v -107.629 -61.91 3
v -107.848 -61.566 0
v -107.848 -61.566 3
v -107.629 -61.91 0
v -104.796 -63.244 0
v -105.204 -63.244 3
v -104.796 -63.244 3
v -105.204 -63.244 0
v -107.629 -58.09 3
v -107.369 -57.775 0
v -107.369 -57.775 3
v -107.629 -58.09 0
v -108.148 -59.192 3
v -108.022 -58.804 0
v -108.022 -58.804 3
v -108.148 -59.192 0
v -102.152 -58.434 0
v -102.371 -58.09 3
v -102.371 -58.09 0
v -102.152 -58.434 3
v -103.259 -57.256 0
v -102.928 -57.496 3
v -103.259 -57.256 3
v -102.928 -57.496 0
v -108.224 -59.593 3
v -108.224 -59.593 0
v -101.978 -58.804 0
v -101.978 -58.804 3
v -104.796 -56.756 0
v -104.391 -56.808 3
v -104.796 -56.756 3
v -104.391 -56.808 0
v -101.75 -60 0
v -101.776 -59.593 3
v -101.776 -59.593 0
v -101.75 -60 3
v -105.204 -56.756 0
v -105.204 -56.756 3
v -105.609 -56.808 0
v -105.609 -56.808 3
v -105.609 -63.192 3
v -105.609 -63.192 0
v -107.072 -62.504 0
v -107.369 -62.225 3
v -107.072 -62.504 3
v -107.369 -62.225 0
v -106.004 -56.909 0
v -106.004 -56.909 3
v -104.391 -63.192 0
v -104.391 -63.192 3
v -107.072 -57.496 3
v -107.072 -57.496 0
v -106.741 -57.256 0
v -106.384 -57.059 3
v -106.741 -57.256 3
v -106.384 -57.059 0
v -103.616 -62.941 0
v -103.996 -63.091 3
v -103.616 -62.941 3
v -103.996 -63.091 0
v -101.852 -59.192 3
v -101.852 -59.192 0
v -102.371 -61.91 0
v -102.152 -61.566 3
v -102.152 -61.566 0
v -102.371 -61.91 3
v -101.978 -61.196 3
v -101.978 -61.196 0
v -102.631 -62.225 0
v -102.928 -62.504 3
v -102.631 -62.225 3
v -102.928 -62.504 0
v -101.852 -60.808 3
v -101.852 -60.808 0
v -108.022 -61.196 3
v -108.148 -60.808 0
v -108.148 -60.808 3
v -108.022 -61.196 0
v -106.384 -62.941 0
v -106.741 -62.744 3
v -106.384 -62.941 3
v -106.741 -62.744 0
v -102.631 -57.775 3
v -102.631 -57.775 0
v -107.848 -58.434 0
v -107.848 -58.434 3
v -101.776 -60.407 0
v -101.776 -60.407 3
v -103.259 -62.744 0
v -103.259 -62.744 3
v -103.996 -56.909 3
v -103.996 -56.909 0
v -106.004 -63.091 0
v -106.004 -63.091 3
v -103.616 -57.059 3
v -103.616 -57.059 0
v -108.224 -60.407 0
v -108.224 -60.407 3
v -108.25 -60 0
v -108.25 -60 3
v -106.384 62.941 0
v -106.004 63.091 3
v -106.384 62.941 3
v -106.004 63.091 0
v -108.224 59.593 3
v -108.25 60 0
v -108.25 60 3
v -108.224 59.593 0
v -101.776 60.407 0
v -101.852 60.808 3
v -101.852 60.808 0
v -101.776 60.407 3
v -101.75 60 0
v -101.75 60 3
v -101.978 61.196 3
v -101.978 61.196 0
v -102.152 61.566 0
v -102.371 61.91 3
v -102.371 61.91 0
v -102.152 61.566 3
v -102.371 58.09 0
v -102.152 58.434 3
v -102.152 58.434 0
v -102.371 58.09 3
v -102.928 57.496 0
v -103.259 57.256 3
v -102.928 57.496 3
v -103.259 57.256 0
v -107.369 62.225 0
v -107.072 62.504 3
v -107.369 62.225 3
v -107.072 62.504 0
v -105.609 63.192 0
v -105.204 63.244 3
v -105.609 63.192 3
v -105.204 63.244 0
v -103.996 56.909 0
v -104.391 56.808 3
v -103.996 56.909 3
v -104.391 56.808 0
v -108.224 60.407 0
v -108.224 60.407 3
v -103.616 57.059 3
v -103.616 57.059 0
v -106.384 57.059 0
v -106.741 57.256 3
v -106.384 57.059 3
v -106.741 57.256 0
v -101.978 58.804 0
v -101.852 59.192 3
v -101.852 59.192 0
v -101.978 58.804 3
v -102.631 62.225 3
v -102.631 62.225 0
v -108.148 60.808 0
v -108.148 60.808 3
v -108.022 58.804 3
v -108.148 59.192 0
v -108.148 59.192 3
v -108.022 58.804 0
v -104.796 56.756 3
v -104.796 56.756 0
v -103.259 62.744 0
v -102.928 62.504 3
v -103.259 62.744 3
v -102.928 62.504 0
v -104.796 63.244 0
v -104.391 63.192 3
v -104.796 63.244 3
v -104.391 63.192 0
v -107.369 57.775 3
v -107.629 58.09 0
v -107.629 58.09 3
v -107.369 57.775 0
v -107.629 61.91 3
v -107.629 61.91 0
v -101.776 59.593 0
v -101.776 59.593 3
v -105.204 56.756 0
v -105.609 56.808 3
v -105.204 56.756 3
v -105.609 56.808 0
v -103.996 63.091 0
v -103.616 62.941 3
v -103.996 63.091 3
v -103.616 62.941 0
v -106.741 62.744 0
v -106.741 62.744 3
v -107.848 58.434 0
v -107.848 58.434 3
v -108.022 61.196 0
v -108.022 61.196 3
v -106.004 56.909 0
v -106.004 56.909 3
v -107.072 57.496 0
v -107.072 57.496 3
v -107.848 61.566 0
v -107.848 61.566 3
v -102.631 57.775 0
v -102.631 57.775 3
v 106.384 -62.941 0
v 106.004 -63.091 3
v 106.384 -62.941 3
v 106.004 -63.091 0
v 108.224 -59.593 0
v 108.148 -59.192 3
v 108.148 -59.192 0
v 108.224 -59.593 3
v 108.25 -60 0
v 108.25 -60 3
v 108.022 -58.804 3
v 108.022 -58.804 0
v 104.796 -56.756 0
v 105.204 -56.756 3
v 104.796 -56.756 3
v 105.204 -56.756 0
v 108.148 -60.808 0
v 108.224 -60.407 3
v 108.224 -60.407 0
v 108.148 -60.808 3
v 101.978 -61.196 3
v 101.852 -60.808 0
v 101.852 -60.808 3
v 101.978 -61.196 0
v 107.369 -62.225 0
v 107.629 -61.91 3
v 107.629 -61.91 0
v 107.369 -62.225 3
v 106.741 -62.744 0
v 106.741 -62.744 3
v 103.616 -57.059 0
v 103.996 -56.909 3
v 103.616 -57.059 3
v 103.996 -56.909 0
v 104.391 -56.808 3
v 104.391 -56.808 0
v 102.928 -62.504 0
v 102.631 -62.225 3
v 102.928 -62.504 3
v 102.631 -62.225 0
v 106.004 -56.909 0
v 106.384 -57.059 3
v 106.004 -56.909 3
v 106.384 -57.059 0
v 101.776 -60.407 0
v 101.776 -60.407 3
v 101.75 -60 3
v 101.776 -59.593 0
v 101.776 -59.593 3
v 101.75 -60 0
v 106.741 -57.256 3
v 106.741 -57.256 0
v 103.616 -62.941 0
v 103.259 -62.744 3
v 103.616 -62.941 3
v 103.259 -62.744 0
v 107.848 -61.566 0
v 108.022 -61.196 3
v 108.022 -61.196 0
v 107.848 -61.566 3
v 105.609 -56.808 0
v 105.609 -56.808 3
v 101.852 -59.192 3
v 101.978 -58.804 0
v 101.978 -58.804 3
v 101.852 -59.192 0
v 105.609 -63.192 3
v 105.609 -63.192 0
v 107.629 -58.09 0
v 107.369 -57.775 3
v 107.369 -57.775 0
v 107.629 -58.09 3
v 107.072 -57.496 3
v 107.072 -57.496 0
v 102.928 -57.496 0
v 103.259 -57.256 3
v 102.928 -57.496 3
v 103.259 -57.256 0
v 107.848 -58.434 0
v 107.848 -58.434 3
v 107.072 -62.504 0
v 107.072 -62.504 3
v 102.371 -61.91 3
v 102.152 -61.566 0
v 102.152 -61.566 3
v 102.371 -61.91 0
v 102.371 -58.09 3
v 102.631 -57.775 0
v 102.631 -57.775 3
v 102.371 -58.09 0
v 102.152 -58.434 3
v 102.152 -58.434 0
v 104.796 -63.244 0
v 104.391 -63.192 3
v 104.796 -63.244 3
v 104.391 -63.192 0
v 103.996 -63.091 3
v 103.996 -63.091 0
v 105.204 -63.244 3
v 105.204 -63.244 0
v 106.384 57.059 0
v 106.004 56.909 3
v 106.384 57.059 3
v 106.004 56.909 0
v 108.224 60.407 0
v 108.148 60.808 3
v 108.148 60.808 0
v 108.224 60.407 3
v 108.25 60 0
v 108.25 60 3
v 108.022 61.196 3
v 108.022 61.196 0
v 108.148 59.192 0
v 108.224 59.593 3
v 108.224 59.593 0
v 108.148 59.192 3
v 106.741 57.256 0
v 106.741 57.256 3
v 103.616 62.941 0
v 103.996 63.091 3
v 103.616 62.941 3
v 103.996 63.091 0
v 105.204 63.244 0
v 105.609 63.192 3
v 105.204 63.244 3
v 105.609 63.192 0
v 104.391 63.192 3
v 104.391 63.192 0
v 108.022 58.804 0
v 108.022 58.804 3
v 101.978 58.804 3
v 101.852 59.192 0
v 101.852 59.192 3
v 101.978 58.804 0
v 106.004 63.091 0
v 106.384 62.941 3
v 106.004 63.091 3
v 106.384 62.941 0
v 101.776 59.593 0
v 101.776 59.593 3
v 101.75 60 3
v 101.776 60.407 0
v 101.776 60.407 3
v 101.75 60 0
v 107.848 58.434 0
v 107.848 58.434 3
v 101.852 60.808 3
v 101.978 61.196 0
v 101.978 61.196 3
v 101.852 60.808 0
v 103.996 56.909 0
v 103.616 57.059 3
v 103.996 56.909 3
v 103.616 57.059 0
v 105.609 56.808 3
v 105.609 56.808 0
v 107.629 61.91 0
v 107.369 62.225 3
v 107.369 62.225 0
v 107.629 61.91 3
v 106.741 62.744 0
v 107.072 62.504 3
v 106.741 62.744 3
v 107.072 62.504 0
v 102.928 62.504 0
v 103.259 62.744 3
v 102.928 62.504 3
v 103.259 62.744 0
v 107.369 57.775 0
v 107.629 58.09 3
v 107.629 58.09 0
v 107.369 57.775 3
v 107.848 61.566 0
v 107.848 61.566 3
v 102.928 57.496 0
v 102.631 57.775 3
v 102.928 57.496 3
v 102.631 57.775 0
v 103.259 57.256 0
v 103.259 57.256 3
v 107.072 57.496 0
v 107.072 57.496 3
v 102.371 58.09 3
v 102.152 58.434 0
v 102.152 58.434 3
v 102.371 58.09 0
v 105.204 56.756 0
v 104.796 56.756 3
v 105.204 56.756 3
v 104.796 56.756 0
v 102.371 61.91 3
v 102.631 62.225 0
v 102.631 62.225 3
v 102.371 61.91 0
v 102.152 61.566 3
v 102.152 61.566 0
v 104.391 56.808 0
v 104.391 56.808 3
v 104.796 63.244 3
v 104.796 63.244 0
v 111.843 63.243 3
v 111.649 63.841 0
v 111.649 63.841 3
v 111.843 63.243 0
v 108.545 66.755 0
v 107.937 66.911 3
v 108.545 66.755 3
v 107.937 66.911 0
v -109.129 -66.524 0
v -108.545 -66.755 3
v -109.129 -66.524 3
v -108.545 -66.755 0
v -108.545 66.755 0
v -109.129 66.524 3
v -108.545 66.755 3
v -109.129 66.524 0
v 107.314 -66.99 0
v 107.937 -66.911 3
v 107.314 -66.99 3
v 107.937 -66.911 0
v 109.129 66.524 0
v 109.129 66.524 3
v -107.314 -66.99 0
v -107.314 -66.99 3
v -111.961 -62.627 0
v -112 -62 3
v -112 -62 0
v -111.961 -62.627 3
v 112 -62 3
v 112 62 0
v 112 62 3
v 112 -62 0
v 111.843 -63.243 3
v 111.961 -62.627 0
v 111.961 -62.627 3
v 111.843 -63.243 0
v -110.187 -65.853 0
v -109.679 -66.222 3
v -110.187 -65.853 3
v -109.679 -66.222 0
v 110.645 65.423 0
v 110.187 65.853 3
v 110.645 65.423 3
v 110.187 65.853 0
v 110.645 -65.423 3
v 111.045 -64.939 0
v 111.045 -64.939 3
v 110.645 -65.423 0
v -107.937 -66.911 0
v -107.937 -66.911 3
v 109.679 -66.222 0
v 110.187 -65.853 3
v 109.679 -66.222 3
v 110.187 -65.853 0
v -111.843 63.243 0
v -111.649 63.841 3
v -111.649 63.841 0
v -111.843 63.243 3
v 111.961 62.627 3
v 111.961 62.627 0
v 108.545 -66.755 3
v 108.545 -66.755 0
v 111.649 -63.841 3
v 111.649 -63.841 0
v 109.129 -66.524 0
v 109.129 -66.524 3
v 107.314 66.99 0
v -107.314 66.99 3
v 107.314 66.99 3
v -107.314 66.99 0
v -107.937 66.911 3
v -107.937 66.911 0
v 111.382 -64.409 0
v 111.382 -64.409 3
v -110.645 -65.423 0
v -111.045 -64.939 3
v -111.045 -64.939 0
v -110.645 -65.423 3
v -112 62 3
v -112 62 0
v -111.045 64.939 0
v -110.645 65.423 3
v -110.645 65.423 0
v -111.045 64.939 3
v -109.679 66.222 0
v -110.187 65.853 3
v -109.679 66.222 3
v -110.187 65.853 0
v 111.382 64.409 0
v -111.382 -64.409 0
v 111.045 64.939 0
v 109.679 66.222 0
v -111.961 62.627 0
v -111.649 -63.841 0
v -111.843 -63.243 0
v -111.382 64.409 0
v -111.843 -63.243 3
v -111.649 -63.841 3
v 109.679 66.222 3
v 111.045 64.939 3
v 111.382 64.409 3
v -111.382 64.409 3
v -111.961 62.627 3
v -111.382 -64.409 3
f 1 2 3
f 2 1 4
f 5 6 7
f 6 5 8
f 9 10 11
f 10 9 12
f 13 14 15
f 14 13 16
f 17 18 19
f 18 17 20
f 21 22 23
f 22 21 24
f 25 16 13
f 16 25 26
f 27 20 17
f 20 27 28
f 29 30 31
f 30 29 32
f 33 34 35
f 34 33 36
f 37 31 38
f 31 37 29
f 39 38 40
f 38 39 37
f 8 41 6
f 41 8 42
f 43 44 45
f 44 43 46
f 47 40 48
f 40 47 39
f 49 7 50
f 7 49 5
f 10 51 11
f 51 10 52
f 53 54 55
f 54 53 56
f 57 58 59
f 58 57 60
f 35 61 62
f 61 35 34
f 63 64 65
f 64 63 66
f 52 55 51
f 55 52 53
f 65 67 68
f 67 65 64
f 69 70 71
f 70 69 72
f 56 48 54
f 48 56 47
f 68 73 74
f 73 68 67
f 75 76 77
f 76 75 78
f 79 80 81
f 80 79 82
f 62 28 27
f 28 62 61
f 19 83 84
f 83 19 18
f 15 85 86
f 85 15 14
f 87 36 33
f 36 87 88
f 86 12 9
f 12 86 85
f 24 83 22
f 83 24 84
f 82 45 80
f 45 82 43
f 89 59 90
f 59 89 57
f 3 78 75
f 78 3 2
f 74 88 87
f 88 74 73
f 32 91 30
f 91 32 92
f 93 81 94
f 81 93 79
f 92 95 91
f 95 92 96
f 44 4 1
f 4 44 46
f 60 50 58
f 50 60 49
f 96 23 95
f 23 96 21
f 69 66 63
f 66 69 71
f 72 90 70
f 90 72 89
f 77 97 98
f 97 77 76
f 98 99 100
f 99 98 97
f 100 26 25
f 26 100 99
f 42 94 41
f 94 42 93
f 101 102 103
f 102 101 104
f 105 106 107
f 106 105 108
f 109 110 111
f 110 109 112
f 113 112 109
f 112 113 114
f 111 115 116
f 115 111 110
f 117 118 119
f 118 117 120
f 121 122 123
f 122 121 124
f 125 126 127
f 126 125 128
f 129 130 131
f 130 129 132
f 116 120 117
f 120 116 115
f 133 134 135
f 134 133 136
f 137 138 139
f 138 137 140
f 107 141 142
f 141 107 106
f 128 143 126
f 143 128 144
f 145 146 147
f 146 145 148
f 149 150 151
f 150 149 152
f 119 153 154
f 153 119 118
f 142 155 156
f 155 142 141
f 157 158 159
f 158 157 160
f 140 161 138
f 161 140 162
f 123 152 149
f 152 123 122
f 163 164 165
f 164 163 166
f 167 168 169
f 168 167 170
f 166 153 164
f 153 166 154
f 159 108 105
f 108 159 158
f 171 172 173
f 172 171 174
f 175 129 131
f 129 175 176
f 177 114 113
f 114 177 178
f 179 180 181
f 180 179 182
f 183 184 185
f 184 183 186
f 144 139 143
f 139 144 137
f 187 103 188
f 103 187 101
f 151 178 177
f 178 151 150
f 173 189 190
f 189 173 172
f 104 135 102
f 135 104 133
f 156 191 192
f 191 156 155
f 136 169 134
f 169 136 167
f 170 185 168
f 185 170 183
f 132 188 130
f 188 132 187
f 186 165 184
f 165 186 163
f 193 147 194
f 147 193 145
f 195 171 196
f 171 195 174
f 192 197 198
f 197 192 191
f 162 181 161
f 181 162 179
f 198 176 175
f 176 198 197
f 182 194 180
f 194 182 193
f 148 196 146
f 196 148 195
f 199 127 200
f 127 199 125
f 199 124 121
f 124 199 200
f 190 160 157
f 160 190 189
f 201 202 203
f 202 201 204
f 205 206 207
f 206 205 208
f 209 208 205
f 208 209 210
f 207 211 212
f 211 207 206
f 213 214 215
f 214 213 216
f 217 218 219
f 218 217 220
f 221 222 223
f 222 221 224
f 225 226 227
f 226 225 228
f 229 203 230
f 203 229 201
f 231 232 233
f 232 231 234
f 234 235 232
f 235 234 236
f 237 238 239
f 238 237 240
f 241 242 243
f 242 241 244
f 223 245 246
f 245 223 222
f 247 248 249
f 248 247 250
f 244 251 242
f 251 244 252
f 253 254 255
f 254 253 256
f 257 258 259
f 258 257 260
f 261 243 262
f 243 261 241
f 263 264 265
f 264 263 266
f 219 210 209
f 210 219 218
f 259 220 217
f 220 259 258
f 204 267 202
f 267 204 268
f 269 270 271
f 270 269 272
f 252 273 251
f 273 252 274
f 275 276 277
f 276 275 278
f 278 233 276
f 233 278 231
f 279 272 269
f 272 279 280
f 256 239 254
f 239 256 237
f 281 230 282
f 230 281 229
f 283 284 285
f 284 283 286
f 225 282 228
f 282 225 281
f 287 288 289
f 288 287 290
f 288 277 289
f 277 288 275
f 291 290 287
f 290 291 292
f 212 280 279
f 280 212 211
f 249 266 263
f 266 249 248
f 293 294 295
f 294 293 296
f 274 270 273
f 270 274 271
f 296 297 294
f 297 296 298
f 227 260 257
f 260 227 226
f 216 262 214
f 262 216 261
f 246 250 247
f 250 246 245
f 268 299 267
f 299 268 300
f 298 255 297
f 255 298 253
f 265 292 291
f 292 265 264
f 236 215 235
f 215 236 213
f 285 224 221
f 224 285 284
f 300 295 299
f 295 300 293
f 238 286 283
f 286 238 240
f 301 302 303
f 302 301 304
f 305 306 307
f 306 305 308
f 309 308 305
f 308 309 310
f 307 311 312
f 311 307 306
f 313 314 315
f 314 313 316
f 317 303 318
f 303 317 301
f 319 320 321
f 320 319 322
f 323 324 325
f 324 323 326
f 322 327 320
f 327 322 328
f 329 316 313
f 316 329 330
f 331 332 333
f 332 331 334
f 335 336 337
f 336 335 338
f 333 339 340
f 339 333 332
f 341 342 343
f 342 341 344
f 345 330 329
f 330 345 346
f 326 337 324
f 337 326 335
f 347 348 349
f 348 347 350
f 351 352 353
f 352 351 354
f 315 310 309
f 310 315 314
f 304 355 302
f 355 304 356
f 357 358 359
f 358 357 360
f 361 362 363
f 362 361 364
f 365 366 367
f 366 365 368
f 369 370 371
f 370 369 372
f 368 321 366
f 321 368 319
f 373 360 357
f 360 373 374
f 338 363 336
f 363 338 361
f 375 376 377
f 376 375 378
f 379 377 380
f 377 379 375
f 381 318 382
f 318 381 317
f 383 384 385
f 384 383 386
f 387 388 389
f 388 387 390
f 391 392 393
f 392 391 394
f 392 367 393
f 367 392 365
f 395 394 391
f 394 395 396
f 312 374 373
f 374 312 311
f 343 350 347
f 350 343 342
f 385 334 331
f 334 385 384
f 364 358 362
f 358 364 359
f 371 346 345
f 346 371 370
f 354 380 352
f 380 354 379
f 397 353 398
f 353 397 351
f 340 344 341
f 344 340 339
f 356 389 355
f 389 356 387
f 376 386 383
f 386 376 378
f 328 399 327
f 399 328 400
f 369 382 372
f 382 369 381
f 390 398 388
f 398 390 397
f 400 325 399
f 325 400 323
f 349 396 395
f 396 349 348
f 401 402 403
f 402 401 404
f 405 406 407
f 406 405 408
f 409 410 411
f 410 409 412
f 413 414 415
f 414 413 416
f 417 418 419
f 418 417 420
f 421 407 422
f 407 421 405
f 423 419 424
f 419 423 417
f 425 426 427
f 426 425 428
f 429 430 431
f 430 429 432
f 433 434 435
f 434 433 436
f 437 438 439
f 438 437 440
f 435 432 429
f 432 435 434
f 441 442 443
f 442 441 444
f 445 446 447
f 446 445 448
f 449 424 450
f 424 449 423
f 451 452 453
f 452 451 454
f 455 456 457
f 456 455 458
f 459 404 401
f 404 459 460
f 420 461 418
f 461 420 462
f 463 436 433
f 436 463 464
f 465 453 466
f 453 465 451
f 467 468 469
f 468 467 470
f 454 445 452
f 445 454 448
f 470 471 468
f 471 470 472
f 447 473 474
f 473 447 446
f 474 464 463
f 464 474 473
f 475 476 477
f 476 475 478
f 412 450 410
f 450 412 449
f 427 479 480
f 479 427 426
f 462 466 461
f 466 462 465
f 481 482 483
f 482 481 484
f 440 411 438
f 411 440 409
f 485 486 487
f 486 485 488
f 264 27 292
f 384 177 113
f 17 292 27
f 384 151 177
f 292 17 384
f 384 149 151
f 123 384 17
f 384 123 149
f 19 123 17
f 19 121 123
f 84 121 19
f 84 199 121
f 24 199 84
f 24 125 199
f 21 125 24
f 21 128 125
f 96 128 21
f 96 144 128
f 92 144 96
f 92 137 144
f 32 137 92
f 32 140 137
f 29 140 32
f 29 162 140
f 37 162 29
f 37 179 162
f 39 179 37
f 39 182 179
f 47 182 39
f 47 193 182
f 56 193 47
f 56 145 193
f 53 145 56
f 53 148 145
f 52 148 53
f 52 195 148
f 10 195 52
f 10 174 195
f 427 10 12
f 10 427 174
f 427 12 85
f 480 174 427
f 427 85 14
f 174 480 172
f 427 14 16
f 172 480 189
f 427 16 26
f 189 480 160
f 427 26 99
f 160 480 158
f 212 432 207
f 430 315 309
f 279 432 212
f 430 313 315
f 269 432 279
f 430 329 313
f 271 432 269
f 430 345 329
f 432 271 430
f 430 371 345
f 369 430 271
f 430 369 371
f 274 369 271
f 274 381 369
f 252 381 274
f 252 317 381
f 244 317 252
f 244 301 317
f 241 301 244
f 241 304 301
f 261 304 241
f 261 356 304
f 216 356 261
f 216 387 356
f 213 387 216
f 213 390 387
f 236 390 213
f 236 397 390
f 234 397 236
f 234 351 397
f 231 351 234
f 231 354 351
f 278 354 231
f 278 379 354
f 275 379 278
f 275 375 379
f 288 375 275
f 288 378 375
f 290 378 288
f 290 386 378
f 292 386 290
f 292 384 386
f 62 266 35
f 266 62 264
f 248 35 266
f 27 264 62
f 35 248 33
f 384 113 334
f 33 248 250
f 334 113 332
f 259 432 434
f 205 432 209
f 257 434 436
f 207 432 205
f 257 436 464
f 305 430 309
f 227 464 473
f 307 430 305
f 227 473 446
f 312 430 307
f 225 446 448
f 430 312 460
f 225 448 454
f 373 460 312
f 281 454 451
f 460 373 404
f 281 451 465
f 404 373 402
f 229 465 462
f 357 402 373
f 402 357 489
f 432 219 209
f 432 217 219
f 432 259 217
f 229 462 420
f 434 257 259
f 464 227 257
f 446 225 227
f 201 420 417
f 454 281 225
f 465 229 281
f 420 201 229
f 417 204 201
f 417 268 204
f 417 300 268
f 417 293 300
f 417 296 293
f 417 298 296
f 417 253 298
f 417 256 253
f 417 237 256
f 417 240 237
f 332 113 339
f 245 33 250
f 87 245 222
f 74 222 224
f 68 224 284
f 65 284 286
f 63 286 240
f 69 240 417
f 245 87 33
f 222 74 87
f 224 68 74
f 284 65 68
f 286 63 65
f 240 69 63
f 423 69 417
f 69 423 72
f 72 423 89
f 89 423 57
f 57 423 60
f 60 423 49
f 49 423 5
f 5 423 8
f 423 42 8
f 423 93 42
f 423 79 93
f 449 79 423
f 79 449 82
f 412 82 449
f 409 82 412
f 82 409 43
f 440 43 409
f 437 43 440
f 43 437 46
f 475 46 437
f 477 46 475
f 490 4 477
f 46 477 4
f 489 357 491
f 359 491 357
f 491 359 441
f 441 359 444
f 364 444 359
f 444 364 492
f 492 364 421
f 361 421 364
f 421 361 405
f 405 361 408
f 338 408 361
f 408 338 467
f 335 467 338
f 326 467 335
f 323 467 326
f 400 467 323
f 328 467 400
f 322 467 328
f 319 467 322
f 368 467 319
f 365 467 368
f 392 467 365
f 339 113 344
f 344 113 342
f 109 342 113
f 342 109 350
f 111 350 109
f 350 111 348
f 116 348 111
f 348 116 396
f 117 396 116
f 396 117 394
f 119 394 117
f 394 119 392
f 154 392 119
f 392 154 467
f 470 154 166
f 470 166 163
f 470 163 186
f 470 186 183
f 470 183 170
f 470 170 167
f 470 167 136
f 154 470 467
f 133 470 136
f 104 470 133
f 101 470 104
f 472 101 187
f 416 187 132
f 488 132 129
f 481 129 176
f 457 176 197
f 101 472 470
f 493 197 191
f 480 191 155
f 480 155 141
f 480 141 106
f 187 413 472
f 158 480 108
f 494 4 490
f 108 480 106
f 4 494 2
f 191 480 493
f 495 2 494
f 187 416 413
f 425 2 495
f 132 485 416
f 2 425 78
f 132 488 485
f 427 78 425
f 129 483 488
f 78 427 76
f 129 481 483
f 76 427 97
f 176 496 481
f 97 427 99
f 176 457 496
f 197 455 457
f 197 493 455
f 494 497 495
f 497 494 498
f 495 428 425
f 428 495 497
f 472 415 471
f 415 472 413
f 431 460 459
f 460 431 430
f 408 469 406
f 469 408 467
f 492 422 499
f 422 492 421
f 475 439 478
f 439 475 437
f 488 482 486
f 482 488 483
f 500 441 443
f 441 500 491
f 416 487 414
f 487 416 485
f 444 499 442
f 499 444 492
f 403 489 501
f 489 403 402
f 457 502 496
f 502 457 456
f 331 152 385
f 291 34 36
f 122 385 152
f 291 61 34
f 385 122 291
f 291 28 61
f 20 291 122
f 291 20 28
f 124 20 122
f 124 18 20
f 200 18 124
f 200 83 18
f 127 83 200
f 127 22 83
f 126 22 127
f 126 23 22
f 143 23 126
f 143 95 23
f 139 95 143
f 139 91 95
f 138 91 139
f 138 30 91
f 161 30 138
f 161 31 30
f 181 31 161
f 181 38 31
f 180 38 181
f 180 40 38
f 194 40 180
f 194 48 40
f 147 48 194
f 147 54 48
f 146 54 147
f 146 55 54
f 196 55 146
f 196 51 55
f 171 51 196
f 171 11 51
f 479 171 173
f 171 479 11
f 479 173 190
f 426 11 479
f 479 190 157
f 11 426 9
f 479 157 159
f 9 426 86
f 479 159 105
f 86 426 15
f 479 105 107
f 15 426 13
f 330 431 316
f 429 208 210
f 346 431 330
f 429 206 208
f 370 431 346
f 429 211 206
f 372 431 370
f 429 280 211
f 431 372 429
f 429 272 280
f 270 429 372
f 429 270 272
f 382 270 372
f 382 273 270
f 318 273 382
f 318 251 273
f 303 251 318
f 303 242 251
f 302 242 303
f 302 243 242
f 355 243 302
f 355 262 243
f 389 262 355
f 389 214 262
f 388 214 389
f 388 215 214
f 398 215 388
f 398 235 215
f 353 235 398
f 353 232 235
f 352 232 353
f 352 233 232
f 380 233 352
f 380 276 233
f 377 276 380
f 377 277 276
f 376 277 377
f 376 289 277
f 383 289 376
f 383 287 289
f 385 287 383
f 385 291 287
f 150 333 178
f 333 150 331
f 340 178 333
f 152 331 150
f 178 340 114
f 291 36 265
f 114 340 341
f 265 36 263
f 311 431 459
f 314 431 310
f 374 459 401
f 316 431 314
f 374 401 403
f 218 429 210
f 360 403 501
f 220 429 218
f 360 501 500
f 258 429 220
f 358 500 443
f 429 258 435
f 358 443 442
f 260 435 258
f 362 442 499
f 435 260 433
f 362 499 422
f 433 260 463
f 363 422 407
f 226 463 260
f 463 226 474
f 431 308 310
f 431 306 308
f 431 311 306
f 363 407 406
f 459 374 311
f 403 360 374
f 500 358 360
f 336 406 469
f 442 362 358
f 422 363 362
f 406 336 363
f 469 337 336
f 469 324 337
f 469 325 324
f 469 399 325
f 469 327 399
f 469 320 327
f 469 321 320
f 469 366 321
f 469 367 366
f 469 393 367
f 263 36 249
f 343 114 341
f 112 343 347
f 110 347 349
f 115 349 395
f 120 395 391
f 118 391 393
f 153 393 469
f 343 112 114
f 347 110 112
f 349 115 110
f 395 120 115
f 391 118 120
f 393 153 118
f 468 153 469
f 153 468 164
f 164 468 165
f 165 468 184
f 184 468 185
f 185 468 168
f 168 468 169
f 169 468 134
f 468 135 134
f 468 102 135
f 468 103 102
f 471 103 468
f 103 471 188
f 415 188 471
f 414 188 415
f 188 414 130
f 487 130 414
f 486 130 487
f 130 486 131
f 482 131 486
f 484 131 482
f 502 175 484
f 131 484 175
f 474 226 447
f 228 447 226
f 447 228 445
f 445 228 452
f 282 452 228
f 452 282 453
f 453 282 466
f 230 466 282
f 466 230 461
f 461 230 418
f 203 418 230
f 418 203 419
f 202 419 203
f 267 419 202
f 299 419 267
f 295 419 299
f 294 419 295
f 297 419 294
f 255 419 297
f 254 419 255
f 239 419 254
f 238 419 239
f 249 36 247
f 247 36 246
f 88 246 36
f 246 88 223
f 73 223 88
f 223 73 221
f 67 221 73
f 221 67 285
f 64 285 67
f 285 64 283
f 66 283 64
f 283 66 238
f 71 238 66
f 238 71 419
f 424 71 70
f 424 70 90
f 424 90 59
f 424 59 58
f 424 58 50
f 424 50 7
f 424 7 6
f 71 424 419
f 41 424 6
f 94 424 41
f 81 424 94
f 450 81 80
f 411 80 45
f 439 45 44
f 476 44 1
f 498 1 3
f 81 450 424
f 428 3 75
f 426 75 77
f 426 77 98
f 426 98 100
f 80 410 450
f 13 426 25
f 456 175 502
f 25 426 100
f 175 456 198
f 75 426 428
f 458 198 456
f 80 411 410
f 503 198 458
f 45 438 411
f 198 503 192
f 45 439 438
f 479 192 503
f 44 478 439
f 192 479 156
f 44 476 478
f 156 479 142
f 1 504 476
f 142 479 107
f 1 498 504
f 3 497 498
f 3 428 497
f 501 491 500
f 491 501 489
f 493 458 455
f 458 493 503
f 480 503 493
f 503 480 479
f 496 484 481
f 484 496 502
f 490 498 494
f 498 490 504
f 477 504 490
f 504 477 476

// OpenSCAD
$fn = 50;


difference() {
	union() {
		hull() {
			translate(v = [-107.0000000000, 62.0000000000, 0]) {
				cylinder(h = 3, r = 5);
			}
			translate(v = [107.0000000000, 62.0000000000, 0]) {
				cylinder(h = 3, r = 5);
			}
			translate(v = [-107.0000000000, -62.0000000000, 0]) {
				cylinder(h = 3, r = 5);
			}
			translate(v = [107.0000000000, -62.0000000000, 0]) {
				cylinder(h = 3, r = 5);
			}
		}
	}
	union() {
		translate(v = [-105.0000000000, -60.0000000000, -100.0000000000]) {
			cylinder(h = 200, r = 3.2500000000);
		}
		translate(v = [-105.0000000000, 60.0000000000, -100.0000000000]) {
			cylinder(h = 200, r = 3.2500000000);
		}
		translate(v = [105.0000000000, -60.0000000000, -100.0000000000]) {
			cylinder(h = 200, r = 3.2500000000);
		}
		translate(v = [105.0000000000, 60.0000000000, -100.0000000000]) {
			cylinder(h = 200, r = 3.2500000000);
		}
	}
}
